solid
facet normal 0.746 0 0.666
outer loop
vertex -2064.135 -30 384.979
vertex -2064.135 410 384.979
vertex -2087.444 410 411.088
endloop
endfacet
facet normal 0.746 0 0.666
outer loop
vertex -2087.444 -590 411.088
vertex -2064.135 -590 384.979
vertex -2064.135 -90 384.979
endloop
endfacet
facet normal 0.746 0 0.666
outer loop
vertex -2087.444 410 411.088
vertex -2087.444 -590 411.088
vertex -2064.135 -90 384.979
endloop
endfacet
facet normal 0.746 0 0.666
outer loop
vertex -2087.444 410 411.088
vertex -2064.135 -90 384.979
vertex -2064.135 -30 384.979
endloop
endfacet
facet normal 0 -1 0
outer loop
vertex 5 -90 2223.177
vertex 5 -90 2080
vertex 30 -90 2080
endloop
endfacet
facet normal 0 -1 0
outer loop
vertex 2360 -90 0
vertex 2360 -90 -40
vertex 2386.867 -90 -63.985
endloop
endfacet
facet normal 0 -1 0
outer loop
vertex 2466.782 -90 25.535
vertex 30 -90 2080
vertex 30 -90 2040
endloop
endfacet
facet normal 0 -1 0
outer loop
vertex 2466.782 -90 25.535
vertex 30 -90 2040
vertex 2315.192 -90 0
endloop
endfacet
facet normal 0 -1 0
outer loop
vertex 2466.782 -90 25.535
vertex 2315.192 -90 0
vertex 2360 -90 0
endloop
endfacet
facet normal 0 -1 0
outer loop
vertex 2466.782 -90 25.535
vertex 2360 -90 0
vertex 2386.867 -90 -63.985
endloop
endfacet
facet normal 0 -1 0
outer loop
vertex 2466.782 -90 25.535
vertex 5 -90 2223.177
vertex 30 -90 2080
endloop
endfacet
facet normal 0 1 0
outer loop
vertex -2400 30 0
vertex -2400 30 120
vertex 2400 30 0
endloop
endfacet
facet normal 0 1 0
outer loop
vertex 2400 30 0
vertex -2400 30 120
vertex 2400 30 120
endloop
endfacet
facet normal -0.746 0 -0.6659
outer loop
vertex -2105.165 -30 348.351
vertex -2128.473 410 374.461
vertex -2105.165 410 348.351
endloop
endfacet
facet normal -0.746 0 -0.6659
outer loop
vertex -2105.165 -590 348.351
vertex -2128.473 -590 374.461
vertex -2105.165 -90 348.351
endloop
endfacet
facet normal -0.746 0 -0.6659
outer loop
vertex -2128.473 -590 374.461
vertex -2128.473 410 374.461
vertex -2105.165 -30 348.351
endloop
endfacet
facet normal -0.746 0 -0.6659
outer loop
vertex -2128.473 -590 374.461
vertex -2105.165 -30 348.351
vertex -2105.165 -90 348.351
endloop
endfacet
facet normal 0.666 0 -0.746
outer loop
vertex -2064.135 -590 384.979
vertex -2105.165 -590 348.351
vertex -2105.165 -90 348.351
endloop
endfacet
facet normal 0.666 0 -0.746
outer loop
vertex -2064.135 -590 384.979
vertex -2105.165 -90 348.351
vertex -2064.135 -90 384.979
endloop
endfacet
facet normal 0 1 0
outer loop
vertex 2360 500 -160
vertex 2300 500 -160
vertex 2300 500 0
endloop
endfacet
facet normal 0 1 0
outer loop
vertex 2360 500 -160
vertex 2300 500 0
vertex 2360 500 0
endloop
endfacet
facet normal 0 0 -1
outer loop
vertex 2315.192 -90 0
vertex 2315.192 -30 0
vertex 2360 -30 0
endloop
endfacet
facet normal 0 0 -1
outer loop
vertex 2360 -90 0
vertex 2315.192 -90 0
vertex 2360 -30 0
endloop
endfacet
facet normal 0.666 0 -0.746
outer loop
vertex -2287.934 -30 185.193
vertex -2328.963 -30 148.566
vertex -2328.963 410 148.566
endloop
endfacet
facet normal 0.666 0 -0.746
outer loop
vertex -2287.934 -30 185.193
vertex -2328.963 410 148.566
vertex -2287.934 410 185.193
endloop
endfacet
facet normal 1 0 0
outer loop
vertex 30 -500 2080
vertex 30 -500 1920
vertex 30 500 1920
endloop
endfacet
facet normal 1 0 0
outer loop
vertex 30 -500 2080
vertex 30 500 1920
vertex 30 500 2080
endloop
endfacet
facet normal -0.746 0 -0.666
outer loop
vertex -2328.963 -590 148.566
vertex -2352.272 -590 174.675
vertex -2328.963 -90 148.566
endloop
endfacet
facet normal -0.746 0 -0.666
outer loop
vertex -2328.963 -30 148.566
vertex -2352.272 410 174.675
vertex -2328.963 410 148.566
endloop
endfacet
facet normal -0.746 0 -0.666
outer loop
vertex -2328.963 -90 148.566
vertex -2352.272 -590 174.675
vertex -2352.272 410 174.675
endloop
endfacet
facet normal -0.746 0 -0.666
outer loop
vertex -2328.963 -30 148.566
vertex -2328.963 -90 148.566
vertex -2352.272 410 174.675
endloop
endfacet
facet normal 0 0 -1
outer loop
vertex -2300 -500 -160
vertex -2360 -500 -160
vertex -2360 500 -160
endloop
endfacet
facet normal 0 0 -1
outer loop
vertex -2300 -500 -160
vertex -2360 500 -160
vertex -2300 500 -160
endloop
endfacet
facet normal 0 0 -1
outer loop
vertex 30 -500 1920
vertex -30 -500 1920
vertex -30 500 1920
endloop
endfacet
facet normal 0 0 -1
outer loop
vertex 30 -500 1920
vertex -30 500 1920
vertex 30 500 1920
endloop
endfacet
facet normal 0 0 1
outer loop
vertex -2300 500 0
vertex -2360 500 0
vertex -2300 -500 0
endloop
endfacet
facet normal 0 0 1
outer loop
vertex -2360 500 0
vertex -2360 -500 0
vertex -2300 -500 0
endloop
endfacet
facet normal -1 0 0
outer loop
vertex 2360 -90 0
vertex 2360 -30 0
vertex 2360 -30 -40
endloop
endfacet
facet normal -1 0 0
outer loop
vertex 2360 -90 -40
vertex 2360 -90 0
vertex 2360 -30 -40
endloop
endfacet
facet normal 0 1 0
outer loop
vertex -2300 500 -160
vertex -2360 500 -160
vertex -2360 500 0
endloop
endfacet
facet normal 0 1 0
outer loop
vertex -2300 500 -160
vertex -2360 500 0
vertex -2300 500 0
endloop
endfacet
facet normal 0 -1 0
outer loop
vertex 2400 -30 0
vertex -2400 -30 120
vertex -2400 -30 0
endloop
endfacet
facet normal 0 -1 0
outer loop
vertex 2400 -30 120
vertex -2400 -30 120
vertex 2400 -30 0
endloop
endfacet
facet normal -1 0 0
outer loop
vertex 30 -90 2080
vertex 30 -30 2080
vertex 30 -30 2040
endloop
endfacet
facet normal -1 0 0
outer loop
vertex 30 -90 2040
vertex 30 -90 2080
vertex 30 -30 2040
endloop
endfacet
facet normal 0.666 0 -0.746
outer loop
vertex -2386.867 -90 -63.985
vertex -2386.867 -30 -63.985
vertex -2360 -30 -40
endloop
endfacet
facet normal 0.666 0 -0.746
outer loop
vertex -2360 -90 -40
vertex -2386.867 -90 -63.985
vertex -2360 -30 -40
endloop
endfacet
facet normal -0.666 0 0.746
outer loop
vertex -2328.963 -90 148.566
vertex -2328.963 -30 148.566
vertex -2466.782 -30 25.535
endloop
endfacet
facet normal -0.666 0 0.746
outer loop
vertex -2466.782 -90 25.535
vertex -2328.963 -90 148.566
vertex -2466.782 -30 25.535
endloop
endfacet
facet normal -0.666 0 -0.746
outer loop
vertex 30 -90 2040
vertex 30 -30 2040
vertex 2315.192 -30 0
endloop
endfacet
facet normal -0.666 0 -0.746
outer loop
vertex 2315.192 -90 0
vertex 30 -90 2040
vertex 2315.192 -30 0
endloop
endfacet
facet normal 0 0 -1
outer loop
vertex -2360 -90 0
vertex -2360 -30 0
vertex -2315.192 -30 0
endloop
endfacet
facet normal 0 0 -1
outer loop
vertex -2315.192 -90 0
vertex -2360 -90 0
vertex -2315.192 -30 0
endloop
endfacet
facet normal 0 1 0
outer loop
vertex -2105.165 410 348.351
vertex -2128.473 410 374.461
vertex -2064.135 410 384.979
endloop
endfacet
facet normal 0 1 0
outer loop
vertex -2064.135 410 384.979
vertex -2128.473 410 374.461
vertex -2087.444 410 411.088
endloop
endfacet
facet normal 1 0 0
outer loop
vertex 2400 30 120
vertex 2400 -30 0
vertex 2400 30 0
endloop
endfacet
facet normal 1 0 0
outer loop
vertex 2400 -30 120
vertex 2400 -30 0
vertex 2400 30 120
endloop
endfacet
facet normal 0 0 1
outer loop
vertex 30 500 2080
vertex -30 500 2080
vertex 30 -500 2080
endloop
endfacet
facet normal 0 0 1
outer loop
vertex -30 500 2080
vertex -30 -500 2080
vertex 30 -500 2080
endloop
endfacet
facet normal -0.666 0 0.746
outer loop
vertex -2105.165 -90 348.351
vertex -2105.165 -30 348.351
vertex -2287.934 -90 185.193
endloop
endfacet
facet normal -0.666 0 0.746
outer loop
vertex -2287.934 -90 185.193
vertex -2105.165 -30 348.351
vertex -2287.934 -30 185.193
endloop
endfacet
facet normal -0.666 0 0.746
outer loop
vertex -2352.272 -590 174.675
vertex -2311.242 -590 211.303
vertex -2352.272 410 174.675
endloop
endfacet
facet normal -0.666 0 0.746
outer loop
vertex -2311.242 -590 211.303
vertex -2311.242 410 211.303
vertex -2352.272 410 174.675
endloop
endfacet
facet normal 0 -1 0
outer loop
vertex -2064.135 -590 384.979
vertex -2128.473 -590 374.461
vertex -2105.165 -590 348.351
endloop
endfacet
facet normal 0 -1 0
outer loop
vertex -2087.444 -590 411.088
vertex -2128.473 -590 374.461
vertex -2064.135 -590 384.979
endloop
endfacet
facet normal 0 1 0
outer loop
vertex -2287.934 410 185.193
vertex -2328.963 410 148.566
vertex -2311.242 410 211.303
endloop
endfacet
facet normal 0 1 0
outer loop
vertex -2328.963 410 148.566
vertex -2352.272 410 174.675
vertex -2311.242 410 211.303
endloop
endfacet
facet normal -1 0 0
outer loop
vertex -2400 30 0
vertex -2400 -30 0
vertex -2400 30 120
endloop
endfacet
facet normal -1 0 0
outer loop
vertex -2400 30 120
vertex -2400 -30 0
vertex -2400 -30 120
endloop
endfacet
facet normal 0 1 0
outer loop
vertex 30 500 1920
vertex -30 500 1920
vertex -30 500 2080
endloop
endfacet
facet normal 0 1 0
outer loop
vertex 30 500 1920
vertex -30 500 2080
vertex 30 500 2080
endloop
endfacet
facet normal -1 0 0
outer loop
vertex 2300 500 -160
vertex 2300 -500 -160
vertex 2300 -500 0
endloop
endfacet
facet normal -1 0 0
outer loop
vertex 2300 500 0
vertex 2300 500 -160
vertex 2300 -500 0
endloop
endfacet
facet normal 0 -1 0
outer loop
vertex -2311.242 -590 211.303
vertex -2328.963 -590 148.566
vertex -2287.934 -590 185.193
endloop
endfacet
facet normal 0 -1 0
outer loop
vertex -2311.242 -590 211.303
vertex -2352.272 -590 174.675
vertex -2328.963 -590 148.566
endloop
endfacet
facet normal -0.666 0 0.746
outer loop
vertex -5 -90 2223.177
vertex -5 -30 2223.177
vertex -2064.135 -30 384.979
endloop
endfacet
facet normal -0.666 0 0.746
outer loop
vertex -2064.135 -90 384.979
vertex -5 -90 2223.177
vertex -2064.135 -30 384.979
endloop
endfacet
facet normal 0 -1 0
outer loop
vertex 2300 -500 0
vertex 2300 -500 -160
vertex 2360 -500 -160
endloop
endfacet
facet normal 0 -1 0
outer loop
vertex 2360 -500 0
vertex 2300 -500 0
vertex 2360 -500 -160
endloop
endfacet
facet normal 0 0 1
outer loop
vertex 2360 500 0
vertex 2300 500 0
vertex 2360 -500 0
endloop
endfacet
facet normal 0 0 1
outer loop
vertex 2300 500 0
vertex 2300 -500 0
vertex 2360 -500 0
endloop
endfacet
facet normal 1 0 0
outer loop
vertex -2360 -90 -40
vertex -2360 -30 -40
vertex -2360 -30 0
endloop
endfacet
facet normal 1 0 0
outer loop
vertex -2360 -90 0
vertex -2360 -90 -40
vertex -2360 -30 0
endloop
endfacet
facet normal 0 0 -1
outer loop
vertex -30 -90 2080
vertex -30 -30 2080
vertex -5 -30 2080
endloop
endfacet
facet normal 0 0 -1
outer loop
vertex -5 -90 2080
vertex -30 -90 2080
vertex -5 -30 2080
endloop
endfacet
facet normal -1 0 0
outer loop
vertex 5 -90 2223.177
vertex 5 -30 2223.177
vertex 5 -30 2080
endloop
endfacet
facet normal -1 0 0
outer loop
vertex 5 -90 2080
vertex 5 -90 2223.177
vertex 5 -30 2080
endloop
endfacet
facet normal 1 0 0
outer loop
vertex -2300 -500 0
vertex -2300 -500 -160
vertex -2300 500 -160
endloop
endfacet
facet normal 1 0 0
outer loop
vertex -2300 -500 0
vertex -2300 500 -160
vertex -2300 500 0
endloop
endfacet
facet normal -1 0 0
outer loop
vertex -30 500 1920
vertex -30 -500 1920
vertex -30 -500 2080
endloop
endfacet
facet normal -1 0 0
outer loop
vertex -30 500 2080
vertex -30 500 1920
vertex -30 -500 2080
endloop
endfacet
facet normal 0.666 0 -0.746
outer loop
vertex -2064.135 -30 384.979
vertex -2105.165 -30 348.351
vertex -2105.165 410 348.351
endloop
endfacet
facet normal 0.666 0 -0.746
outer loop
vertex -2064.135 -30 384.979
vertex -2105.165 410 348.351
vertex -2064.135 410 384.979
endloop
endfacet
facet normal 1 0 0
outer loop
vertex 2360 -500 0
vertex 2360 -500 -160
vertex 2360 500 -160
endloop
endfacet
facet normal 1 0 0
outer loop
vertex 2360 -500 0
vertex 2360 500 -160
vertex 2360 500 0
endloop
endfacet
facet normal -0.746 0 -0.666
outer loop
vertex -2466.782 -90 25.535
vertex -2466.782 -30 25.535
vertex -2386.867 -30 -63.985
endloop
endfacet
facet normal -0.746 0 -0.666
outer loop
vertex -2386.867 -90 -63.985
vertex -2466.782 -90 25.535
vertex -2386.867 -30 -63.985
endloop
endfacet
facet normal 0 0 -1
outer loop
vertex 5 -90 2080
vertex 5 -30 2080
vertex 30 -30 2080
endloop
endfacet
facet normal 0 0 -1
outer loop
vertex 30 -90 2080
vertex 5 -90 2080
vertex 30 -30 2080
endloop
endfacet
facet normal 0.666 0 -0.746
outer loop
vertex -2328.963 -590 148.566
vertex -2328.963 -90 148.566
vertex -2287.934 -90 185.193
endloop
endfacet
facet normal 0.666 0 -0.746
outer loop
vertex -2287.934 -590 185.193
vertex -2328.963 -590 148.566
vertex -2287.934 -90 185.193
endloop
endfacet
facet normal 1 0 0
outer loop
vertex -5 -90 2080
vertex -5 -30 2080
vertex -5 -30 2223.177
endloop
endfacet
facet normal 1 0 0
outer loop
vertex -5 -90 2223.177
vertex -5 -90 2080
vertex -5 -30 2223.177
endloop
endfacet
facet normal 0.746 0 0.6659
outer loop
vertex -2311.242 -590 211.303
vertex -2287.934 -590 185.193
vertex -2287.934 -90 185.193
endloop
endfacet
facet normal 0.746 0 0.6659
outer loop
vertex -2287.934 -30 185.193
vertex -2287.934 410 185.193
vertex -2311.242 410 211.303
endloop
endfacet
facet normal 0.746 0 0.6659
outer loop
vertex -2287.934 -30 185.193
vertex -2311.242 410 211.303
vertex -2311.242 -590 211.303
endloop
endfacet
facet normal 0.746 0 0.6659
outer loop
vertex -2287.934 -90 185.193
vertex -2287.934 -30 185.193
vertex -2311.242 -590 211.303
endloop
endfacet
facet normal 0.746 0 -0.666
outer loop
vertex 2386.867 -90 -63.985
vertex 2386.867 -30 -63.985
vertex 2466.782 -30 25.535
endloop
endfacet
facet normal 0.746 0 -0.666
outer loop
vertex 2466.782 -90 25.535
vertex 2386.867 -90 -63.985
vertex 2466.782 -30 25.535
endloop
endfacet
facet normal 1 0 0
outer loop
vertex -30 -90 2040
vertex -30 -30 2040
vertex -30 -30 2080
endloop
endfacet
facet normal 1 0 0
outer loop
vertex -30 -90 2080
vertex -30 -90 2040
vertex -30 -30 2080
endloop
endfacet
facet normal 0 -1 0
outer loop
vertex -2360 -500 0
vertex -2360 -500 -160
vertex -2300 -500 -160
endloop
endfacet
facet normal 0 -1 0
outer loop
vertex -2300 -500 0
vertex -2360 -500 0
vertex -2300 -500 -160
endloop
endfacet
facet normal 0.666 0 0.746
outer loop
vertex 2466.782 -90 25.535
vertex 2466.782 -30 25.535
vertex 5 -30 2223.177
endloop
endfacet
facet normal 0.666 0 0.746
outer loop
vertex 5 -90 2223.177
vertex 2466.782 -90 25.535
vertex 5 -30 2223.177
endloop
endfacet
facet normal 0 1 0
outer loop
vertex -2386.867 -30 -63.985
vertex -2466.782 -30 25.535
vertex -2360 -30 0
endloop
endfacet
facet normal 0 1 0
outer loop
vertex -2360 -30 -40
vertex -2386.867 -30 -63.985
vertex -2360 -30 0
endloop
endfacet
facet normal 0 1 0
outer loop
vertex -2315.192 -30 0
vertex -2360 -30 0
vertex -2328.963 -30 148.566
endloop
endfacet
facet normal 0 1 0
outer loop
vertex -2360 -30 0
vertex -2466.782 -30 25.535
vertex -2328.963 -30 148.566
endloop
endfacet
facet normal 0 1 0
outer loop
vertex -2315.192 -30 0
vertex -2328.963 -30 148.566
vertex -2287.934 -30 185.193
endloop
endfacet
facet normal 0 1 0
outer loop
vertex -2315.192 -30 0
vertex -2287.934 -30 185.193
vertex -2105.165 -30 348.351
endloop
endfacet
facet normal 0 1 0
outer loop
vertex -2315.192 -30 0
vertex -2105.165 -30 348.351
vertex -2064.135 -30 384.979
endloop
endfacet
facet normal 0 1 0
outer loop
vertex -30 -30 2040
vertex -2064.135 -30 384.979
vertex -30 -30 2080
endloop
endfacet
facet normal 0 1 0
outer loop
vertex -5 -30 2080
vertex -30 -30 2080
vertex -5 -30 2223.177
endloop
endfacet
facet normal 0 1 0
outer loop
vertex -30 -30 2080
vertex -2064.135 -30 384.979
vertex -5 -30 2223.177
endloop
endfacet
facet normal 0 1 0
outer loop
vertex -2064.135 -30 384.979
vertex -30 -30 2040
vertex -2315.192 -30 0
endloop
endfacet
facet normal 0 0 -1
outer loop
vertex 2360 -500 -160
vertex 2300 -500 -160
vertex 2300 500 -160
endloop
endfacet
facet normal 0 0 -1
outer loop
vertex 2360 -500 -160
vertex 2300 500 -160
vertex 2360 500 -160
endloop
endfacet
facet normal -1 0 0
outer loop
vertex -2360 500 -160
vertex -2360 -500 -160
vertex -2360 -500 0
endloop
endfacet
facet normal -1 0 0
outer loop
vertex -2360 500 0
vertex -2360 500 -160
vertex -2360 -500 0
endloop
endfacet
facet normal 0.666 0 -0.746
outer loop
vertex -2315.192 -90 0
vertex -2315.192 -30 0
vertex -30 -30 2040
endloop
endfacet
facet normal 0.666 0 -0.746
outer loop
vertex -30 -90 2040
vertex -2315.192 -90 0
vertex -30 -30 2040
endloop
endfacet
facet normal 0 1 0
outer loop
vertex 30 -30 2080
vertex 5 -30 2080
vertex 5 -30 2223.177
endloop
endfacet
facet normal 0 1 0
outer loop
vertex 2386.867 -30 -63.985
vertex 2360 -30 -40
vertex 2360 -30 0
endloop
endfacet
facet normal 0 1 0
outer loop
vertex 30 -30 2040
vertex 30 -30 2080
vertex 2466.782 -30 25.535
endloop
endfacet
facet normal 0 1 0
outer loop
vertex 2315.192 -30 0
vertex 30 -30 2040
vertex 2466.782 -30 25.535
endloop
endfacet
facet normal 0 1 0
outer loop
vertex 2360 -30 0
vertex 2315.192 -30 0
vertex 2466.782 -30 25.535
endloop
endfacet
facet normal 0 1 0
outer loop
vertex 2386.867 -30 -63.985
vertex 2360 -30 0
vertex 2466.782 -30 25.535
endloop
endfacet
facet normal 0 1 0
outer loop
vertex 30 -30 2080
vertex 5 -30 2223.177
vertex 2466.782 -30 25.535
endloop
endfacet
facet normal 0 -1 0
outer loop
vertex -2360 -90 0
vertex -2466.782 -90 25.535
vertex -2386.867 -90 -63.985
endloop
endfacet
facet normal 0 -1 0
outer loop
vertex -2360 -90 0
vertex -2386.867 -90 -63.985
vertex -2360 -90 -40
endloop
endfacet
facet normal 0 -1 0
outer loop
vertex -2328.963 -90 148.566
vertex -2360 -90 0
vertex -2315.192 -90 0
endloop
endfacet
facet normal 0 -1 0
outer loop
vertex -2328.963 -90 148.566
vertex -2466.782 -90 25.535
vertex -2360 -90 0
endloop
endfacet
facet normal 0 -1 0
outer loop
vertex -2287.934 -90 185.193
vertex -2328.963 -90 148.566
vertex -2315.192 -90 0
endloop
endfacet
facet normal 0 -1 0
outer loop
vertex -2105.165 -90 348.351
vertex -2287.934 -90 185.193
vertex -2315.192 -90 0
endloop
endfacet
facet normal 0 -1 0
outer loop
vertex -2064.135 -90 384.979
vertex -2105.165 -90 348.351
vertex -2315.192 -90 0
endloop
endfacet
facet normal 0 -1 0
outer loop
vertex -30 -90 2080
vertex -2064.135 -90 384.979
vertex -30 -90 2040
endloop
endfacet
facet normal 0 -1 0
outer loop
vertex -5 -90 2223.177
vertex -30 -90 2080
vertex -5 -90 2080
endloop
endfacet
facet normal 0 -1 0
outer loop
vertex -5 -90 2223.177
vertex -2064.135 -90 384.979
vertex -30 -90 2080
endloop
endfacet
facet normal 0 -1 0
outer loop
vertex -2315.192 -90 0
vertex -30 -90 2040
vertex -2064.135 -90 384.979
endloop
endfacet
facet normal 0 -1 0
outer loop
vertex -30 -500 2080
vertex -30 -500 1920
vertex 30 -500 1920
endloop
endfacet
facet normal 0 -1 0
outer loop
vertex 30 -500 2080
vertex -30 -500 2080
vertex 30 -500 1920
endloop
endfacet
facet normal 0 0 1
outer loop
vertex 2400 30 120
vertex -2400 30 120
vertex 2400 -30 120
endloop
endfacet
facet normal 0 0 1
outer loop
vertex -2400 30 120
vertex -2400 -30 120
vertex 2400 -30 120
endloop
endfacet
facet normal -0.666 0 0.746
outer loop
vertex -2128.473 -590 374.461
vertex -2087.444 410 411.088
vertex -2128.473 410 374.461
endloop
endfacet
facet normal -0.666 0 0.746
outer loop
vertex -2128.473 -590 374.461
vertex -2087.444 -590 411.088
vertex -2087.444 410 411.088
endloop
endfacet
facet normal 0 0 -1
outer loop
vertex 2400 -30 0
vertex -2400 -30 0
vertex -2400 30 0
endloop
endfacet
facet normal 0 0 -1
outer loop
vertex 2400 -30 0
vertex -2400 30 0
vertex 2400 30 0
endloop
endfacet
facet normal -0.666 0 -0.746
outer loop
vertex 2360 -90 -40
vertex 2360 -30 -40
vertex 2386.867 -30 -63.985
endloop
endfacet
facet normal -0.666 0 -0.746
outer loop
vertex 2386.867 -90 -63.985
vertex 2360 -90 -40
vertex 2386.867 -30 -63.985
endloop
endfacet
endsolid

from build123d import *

# Parameters (mm, degrees)
F0_W     = 4800
F0_H     = 120
F1_DEPTH = 30
F2_W     = 60
F2_H     = 160
F3_DEPTH = 500
F5_DEPTH = 60
F7_DEPTH = 500


with BuildPart() as f1:
    # F0 (on Front) → F1 (new body, symmetric)
    with BuildSketch(Plane.XZ):
        with Locations((0, 60)):
            Rectangle(F0_W, F0_H)
    extrude(amount=F1_DEPTH, both=True)


with BuildPart() as f3:
    # F2 (on Front) → F3 (new body, symmetric)
    with BuildSketch(Plane.XZ):
        with Locations((-2330, -80)):
            Rectangle(F2_W, F2_H)
    extrude(amount=F3_DEPTH, both=True)


with BuildPart() as f3b:
    # F2 (on Front) → F3, piece 2 (new body, symmetric)
    with BuildSketch(Plane.XZ):
        with Locations((2330, -80)):
            Rectangle(F2_W, F2_H)
    extrude(amount=F3_DEPTH, both=True)


with BuildPart() as f3c:
    # F2 (on Front) → F3, piece 3 (new body, symmetric)
    with BuildSketch(Plane.XZ):
        with Locations((0, 2000)):
            Rectangle(F2_W, F2_H)
    extrude(amount=F3_DEPTH, both=True)


with BuildPart() as f5:
    # F4 (on face) → F5 (new body)
    with BuildSketch(Plane.XZ.offset(30)):
        Polygon((-30, 2080), (-5, 2080), (-5, 2223.1766985294), (-2466.7817404663, 25.5346297869), (-2386.8674834211, -63.98470623), (-2360, -40), (-2360, 0), (-2315.1923076923, 0), (-30, 2040), align=None)
    extrude(amount=F5_DEPTH)

    # F6 (on face) → F7 (join, symmetric)
    with BuildSketch(Plane.XZ.offset(90)):
        Polygon((-2328.9634040489, 148.5655910523), (-2287.9337083745, 185.1929588646), (-2311.242033346, 211.3027652029), (-2352.2717290204, 174.6753973905), align=None)
        Polygon((-2128.473388978, 374.4610400035), (-2105.1650640065, 348.3512336652), (-2064.1353683321, 384.9786014776), (-2087.4436933036, 411.0884078159), align=None)
    extrude(amount=F7_DEPTH, both=True)


with BuildPart() as f5b:
    # F4 (on face) → F5, piece 2 (new body)
    with BuildSketch(Plane.XZ.offset(30)):
        Polygon((2360, 0), (2360, -40), (2386.8674834211, -63.98470623), (2466.7817404663, 25.5346297869), (5, 2223.1766985294), (5, 2080), (30, 2080), (30, 2040), (2315.1923076923, 0), align=None)
    extrude(amount=F5_DEPTH)


solid = Compound([f1.part, f3.part, f3b.part, f3c.part, f5.part, f5b.part])
